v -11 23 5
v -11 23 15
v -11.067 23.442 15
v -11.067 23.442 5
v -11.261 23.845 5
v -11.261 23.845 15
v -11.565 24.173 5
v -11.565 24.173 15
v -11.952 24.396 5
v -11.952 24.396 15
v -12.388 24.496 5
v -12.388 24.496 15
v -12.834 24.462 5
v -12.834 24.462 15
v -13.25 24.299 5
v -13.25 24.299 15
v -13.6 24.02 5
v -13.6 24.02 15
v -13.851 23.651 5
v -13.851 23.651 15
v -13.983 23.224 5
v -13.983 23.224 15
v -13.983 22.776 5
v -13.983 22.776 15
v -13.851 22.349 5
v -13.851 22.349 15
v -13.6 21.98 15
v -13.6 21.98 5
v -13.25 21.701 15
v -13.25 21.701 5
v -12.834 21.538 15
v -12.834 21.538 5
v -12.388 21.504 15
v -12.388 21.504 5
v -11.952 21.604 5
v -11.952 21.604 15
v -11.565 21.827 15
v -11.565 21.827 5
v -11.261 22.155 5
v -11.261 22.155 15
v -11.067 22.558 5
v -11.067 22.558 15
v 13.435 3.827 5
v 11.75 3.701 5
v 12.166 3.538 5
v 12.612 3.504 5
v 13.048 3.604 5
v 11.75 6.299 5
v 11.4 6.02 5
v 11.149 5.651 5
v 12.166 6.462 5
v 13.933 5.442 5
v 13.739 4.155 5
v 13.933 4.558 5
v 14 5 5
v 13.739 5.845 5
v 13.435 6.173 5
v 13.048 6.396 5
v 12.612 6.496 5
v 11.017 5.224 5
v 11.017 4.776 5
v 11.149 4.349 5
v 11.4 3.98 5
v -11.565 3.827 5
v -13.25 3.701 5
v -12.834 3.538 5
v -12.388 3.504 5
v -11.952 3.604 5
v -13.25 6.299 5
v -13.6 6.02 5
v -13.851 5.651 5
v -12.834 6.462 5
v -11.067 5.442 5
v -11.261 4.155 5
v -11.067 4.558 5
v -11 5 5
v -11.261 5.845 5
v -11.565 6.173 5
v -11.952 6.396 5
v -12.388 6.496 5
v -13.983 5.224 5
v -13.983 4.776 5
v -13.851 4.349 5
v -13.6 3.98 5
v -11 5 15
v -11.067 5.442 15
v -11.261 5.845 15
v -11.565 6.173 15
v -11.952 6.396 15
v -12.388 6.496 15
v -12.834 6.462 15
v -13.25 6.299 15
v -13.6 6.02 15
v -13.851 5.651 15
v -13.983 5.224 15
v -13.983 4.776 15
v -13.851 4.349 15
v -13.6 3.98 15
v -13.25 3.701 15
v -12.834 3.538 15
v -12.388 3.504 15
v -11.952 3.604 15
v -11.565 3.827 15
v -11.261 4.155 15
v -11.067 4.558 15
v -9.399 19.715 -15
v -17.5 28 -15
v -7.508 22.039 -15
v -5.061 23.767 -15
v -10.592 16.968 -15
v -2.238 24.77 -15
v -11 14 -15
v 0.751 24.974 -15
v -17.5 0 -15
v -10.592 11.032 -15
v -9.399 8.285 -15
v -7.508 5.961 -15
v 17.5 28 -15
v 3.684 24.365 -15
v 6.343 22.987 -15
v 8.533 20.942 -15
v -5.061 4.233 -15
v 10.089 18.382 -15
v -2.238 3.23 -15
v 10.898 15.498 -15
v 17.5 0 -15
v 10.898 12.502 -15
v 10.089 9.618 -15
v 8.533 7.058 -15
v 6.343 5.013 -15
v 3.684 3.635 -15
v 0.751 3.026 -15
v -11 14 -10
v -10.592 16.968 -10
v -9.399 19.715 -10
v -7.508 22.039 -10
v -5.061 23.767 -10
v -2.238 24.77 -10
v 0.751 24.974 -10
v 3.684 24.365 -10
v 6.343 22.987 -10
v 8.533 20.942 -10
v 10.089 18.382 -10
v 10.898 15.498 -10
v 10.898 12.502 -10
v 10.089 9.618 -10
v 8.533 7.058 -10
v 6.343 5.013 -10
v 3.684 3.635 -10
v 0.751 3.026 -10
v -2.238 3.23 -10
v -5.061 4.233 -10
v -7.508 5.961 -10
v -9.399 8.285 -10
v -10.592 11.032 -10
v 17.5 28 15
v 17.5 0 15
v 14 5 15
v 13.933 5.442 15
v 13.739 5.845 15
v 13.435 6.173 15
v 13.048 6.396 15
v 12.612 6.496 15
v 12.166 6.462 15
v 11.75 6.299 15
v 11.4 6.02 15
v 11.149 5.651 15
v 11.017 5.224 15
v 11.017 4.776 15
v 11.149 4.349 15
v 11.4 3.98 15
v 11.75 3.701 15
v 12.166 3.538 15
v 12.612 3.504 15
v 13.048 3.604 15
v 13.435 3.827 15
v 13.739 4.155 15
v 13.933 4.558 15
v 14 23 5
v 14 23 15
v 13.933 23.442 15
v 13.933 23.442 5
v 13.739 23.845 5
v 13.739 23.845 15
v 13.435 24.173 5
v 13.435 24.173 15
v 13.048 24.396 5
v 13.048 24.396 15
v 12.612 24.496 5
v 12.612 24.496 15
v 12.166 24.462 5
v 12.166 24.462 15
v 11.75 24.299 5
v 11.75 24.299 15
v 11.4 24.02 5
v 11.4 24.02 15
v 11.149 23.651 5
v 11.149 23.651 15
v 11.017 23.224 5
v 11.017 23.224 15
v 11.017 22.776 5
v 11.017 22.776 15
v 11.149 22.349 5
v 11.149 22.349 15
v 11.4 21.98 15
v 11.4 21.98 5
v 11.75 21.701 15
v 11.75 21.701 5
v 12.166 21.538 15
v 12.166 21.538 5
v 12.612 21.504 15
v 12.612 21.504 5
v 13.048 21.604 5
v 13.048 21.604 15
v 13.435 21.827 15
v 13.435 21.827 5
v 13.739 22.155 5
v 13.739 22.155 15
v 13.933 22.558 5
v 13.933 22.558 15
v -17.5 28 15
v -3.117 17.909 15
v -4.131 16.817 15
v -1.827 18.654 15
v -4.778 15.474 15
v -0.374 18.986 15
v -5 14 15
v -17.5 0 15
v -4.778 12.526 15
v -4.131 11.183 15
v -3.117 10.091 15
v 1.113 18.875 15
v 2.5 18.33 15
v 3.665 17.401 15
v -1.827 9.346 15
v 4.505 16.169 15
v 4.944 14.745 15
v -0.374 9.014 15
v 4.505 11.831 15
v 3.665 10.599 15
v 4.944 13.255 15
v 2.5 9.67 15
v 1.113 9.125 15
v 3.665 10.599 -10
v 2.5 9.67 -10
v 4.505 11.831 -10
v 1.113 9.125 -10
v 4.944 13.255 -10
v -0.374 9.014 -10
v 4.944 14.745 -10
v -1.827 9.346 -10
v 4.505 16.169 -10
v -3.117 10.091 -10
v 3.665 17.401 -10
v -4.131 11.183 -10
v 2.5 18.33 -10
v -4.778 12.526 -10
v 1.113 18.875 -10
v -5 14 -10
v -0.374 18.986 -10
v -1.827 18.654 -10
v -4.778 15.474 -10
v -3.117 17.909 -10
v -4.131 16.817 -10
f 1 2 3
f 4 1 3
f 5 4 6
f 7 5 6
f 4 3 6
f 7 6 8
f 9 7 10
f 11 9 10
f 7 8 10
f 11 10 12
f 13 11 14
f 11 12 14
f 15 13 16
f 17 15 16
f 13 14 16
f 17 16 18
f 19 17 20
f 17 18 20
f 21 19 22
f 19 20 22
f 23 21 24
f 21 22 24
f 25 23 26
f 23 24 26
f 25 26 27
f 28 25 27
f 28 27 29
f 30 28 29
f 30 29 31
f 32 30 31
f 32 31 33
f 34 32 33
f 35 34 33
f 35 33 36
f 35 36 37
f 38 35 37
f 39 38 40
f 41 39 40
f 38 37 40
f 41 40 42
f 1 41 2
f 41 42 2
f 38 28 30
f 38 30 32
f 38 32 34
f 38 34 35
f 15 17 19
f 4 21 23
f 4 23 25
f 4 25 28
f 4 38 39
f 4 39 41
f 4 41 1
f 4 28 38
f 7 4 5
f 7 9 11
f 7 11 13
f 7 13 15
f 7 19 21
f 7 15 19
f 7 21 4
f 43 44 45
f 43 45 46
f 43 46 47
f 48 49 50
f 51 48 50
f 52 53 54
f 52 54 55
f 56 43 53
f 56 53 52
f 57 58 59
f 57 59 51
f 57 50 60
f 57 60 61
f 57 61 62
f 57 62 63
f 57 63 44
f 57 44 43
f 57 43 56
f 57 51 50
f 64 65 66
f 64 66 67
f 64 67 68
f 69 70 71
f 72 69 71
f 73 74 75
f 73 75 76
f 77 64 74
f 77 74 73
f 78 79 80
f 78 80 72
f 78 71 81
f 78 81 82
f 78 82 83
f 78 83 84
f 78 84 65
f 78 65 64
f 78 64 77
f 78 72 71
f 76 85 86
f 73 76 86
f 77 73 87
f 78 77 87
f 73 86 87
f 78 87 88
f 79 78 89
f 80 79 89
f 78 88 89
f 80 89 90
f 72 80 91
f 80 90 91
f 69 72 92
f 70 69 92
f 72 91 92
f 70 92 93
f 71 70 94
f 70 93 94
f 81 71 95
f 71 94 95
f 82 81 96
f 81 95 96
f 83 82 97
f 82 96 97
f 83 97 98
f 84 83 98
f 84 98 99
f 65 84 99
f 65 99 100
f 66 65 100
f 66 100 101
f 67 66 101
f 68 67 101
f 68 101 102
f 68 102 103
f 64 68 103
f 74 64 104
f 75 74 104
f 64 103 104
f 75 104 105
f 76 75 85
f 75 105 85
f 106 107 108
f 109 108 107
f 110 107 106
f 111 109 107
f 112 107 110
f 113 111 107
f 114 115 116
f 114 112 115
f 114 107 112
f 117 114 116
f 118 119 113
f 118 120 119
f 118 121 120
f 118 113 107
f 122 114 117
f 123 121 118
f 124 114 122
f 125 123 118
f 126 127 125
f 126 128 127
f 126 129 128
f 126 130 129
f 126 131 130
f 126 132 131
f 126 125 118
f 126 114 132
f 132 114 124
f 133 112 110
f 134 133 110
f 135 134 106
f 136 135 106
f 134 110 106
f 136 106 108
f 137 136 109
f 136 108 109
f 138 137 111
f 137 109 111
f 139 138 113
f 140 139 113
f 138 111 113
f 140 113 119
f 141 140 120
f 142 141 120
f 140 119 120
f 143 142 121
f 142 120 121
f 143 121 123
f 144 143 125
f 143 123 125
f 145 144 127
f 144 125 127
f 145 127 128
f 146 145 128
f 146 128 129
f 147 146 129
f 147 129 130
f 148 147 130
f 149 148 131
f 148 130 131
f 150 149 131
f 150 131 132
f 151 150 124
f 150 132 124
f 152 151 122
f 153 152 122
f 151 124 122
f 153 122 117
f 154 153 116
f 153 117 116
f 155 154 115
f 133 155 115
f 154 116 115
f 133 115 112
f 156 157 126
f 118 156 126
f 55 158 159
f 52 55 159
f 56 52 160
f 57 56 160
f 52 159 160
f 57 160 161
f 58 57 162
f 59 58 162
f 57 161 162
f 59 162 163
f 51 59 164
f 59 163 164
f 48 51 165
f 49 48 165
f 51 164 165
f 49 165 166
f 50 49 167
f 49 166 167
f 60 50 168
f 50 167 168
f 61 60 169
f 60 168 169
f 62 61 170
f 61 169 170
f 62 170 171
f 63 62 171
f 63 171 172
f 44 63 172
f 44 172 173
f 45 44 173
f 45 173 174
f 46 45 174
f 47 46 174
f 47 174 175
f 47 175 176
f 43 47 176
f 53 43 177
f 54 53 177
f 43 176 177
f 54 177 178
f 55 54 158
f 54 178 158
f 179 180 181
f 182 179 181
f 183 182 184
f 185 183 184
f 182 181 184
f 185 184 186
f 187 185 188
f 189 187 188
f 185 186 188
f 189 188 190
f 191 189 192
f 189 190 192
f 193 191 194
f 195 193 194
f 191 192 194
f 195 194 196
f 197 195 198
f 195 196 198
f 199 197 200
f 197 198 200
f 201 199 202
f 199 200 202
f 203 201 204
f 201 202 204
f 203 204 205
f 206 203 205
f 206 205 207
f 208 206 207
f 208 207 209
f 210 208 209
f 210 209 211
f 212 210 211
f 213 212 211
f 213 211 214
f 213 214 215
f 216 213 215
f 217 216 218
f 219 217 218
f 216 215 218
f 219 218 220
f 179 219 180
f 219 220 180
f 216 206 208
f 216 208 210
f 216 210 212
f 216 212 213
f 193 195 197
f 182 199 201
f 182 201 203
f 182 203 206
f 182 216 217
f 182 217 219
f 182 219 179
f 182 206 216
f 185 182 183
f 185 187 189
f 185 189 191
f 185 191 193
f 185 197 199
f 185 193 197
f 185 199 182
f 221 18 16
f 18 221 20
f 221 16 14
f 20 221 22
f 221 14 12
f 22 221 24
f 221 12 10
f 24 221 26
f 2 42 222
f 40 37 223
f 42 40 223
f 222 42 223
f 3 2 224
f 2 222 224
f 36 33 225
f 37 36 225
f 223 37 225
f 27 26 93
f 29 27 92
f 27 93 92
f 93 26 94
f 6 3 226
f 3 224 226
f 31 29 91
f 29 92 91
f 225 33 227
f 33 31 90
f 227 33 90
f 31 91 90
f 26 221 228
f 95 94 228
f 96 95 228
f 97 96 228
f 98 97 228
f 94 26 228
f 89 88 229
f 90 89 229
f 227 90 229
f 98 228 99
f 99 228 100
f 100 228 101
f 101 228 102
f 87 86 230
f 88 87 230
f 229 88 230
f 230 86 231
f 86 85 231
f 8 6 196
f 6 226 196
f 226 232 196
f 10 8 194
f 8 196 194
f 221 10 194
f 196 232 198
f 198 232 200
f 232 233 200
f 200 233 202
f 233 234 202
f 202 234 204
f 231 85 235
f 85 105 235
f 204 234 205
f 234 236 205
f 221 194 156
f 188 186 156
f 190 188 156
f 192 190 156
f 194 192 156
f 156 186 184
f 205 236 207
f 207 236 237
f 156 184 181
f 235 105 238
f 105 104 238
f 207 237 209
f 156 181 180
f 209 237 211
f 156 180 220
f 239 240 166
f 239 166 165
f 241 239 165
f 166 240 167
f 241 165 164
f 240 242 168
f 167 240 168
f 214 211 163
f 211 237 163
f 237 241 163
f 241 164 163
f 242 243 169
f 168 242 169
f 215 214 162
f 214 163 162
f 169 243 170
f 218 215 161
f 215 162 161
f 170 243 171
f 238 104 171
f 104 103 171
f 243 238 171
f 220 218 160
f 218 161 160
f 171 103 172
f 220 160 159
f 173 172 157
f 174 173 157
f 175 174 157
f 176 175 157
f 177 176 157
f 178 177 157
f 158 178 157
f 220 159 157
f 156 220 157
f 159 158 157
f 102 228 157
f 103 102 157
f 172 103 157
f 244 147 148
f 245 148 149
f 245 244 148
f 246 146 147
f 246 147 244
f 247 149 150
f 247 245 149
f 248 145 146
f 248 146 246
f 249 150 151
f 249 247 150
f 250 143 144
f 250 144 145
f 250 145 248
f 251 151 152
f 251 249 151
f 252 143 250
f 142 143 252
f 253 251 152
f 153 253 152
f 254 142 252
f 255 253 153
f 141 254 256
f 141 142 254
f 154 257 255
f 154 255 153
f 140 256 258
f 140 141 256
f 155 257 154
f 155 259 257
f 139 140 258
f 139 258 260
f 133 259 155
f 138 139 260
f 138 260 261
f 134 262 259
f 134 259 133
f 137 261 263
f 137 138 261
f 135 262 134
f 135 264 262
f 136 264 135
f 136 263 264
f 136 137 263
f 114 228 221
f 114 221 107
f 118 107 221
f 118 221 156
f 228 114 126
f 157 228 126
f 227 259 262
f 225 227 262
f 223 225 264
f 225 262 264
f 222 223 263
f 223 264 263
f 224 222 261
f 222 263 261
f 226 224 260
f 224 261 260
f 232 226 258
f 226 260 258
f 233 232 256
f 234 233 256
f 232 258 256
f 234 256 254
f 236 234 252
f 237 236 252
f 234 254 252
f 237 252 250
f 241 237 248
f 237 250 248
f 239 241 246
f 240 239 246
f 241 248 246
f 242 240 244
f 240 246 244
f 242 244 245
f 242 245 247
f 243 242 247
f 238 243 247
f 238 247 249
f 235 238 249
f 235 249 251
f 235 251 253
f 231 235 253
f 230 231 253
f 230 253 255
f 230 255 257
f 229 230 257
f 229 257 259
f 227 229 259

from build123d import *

# Parameters (mm, degrees)
SKETCH1_W           = 35
SKETCH1_H           = 30
BOSS_EXTRUDE1_DEPTH = 28
SKETCH2_R           = 1.5
CUT_EXTRUDE1_DEPTH  = 10
SKETCH3_R           = 11
CUT_EXTRUDE2_DEPTH  = 5
SKETCH4_R           = 5
CUT_EXTRUDE3_DEPTH  = 42.41557678


with BuildPart() as part:
    # Sketch1 → Boss-Extrude1 (new body)
    with BuildSketch(Plane(origin=(0, 0, 0), x_dir=(1, 0, 0), z_dir=(0, 1, 0))):
        Rectangle(SKETCH1_W, SKETCH1_H)
    extrude(amount=BOSS_EXTRUDE1_DEPTH)

    # Sketch2 → Cut-Extrude1 (cut)
    with BuildSketch(Plane.XY.offset(15)):
        with Locations((-12.5, 23)):
            Circle(SKETCH2_R)
        with Locations((12.5, 23)):
            Circle(SKETCH2_R)
        with Locations((12.5, 5)):
            Circle(SKETCH2_R)
        with Locations((-12.5, 5)):
            Circle(SKETCH2_R)
    extrude(amount=-CUT_EXTRUDE1_DEPTH, mode=Mode.SUBTRACT)

    # Sketch3 → Cut-Extrude2 (cut)
    with BuildSketch(Plane(origin=(0, 0, -15), x_dir=(-1, 0, 0), z_dir=(0, 0, -1))):
        with Locations((0, 14)):
            Circle(SKETCH3_R)
    extrude(amount=-CUT_EXTRUDE2_DEPTH, mode=Mode.SUBTRACT)

    # Sketch4 → Cut-Extrude3 (cut, through all)
    with BuildSketch(Plane(origin=(0, 0, -10), x_dir=(-1, 0, 0), z_dir=(0, 0, -1))):
        with Locations((0, 14)):
            Circle(SKETCH4_R)
    extrude(amount=-CUT_EXTRUDE3_DEPTH, mode=Mode.SUBTRACT)


solid = part.part
